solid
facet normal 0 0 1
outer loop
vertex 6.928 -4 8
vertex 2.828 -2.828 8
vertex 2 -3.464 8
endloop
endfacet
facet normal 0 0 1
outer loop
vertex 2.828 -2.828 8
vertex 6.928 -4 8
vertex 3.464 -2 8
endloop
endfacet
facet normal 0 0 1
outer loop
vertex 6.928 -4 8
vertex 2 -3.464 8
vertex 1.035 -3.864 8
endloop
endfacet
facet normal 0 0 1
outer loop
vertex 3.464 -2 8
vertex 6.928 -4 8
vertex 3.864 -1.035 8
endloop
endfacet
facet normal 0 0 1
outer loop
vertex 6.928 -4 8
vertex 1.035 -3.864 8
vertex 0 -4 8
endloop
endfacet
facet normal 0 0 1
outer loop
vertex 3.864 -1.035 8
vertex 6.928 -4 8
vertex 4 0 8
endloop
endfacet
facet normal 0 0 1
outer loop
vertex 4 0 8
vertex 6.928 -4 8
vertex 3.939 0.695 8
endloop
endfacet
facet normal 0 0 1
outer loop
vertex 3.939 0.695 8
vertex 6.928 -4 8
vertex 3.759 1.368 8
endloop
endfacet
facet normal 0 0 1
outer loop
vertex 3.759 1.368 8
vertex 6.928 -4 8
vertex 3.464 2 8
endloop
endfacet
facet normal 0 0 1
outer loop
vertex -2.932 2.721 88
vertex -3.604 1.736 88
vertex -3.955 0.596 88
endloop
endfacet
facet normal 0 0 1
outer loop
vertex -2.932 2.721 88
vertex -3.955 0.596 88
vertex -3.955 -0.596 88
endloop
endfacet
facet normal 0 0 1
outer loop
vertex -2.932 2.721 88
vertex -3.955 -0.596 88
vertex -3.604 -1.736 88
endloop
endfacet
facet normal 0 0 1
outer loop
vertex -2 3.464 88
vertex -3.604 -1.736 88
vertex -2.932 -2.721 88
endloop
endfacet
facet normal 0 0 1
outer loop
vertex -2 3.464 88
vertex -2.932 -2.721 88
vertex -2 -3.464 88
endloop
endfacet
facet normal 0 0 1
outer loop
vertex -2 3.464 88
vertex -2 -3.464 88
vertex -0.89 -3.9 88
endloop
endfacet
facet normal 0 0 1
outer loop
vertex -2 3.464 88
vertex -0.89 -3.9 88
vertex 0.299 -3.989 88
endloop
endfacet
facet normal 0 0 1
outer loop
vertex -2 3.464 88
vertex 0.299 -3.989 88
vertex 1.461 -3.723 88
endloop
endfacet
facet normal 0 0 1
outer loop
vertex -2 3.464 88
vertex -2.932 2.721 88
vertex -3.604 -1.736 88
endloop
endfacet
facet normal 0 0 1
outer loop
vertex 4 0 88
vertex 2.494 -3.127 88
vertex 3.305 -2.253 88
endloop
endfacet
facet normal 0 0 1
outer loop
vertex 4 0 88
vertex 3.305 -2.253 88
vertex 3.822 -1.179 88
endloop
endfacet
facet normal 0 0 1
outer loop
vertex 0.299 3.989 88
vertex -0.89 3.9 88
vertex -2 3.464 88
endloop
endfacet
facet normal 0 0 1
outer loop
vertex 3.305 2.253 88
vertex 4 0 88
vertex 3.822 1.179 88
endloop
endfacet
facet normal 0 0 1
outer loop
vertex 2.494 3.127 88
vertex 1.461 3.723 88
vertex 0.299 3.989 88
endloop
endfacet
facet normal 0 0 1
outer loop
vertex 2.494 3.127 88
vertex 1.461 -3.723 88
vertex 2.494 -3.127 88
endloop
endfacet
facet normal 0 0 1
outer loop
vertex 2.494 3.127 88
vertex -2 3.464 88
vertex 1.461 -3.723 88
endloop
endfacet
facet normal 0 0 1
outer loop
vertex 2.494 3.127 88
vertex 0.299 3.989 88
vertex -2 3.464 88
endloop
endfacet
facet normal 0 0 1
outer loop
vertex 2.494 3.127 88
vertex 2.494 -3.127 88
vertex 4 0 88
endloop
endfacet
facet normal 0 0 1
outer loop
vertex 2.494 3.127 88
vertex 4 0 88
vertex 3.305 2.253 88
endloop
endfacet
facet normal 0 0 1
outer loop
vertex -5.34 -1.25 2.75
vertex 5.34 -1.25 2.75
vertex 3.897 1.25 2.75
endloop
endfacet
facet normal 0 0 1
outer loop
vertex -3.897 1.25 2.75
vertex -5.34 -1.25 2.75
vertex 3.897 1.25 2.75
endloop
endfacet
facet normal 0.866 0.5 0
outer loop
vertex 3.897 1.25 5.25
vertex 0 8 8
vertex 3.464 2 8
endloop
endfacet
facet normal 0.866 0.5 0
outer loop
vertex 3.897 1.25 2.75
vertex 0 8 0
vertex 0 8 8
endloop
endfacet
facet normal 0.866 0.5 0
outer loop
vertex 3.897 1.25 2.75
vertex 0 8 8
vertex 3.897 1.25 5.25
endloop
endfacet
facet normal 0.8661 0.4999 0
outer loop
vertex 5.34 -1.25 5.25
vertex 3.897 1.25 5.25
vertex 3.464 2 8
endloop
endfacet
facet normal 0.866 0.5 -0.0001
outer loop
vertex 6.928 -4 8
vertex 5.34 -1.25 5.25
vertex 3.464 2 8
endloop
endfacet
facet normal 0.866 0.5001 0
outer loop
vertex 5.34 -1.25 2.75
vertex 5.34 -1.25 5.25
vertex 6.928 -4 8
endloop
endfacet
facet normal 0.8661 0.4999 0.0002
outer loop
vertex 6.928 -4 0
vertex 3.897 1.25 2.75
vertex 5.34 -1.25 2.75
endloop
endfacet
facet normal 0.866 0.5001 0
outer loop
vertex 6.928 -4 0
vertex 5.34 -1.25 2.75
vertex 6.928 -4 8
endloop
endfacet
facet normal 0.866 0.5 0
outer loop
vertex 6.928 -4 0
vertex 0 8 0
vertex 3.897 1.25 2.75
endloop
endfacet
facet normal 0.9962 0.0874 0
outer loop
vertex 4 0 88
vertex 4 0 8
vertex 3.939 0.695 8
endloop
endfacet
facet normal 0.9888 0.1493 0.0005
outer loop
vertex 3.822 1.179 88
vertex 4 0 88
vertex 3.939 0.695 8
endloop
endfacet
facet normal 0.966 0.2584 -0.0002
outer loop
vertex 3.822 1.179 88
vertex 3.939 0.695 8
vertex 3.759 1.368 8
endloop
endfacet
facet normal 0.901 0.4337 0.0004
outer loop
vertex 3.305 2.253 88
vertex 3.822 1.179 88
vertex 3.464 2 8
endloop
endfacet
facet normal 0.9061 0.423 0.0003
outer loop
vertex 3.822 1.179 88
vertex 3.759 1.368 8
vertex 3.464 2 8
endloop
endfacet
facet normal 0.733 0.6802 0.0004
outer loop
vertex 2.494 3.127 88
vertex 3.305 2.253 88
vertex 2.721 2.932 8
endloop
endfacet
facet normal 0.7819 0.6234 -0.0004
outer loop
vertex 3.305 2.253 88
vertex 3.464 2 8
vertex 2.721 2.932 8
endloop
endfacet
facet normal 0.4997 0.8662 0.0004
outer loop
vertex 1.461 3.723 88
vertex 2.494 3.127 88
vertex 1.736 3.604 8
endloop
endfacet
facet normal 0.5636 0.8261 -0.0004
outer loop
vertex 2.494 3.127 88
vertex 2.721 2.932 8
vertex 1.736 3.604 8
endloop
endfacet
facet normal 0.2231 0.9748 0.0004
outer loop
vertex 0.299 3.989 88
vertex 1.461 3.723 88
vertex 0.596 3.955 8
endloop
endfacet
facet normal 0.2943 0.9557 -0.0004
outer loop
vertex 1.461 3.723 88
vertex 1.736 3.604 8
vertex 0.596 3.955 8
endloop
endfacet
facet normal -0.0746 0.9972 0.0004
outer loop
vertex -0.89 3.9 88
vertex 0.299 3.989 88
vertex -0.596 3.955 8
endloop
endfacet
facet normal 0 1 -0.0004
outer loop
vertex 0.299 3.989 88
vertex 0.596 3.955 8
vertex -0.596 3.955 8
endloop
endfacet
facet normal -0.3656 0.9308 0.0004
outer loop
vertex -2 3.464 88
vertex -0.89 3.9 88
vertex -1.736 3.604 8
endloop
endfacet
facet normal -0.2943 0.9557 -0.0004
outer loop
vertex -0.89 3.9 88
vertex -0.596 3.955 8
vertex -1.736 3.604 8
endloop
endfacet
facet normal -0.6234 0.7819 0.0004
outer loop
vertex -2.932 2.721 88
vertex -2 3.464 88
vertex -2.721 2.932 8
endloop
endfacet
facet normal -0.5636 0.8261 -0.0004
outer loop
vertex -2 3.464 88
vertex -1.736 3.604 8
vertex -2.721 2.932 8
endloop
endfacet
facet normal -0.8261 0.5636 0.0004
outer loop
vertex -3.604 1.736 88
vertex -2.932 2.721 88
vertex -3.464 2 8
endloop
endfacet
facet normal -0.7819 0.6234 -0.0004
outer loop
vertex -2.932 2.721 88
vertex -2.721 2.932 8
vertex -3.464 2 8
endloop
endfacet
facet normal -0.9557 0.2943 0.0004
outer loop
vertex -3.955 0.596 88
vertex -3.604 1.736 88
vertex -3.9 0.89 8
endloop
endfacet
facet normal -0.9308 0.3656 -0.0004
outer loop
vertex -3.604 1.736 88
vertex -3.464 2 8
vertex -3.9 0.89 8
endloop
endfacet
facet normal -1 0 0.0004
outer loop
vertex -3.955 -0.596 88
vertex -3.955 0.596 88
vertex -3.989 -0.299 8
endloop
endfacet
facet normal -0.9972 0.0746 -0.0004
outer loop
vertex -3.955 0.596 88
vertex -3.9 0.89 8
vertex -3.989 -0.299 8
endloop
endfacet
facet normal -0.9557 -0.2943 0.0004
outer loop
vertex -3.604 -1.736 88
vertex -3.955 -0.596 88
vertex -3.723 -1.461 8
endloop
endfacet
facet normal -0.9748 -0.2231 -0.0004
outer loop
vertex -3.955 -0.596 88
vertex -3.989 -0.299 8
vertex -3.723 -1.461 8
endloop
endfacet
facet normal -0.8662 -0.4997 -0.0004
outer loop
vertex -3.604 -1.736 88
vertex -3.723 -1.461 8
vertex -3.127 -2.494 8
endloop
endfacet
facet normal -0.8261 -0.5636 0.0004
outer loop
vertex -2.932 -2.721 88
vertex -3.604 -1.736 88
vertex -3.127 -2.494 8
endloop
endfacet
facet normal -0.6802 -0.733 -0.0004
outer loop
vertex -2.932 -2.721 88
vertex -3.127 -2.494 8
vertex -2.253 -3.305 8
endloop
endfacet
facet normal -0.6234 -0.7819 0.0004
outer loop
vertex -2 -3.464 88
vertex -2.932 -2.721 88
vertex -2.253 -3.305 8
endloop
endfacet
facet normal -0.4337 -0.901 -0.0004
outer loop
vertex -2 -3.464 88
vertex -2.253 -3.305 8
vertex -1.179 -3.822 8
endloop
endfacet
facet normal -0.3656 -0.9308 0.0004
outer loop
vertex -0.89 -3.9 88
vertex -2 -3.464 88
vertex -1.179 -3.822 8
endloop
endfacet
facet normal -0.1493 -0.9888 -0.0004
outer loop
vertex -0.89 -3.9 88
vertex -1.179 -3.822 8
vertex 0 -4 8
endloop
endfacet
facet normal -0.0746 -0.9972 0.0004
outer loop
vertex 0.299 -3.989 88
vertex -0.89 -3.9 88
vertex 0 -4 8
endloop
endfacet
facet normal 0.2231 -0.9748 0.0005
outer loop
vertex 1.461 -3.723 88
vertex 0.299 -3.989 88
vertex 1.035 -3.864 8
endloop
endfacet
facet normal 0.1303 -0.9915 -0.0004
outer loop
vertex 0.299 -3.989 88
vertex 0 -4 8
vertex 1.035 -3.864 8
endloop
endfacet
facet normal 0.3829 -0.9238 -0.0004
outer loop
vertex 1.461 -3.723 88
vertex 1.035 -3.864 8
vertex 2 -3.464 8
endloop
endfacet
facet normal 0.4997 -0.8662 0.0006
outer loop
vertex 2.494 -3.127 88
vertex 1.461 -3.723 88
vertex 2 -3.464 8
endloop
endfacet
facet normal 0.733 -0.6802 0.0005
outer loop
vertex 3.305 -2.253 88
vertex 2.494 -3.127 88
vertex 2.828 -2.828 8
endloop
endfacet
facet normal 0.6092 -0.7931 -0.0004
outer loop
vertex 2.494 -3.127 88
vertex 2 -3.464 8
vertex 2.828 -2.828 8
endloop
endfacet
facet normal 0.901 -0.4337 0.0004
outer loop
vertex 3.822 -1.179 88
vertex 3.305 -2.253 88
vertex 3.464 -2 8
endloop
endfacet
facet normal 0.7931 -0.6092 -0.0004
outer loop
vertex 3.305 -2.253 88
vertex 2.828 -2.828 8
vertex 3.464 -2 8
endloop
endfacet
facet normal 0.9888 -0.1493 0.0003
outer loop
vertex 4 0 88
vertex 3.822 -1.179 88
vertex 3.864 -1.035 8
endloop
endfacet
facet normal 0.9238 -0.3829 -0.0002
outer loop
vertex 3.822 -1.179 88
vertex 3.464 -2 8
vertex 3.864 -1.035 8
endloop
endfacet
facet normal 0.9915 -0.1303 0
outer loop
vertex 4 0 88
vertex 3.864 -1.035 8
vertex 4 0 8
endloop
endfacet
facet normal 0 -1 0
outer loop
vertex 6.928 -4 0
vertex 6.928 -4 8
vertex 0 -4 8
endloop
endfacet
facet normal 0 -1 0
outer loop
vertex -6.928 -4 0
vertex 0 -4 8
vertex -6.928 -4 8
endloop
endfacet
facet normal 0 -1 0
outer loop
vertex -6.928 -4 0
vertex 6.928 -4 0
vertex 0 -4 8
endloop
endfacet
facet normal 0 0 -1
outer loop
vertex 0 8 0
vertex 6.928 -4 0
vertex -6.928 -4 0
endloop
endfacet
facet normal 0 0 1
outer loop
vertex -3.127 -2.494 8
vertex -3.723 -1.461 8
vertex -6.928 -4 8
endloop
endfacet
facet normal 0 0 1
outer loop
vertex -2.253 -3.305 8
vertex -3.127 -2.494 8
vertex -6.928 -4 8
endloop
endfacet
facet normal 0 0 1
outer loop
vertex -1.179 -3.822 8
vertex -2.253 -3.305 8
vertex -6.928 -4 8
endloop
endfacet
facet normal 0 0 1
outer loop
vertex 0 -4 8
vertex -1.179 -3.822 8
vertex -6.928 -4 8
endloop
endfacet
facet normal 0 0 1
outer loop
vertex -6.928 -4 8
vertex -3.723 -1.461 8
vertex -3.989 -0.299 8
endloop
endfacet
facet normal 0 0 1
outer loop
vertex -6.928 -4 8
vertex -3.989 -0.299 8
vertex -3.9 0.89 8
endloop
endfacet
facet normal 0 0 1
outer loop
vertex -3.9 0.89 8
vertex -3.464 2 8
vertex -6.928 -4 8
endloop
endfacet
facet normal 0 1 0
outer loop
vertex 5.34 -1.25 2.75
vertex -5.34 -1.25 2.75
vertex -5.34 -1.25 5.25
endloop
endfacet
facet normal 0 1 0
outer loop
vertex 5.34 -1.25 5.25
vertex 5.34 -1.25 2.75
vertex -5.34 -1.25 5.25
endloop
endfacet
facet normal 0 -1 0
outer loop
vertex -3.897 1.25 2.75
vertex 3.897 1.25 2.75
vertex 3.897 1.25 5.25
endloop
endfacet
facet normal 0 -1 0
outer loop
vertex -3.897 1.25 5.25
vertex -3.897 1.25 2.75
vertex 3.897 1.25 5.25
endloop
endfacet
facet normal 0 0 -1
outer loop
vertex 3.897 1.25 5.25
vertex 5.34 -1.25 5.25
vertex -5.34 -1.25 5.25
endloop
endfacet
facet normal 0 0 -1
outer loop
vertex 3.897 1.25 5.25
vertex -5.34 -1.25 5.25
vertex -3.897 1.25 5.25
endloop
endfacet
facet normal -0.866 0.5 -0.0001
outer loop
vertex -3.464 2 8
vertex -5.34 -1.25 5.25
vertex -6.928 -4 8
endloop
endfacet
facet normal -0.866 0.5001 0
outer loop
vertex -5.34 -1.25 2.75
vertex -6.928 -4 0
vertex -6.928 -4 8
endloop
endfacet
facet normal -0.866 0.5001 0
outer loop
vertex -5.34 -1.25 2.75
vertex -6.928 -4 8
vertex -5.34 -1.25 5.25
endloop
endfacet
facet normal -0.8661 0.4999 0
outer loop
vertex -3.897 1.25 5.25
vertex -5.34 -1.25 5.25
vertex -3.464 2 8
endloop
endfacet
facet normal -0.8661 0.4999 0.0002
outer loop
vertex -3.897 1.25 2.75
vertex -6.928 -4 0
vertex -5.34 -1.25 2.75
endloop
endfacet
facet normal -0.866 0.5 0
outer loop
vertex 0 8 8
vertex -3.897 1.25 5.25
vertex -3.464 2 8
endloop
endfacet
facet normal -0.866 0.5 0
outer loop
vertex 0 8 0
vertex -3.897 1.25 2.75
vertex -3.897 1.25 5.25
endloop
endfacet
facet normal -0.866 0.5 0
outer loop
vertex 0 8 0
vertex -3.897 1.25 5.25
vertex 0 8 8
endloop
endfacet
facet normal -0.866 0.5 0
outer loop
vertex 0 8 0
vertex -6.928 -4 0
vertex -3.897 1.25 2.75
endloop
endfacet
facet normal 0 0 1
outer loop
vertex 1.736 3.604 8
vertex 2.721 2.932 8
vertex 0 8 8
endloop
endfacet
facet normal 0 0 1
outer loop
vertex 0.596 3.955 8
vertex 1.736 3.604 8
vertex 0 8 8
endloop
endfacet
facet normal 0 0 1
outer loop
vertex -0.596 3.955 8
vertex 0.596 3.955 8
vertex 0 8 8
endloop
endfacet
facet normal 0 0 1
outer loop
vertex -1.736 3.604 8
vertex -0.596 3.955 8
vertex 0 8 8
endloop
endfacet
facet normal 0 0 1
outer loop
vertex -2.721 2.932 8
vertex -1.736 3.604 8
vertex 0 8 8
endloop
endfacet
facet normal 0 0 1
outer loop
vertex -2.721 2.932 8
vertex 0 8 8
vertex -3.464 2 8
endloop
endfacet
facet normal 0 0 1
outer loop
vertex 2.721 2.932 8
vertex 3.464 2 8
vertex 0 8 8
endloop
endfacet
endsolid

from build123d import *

# Parameters (mm, degrees)
PAD_DEPTH    = 8
SKETCH002_W  = 2.5
SKETCH002_H  = 2.5
POCKET_DEPTH = 12.929203
SKETCH001_R  = 4
PAD001_DEPTH = 80


with BuildPart() as part:
    # Sketch → Pad (new body)
    with BuildSketch(Plane.XY):
        Polygon((-6.928203, -4), (0, 8), (6.928203, -4), align=None)
    extrude(amount=PAD_DEPTH)

    # Sketch002 (on DatumPlane) → Pocket (cut, through all)
    with BuildSketch(Plane(origin=(6, 0, 4), x_dir=(0, 1, 0), z_dir=(1, 0, 0))):
        Rectangle(SKETCH002_W, SKETCH002_H)
    extrude(amount=-POCKET_DEPTH, mode=Mode.SUBTRACT)

    # Sketch001 (on Local_CS) → Pad001 (join)
    with BuildSketch(Plane.XY.offset(8)):
        Circle(SKETCH001_R)
    extrude(amount=PAD001_DEPTH)


solid = part.part
